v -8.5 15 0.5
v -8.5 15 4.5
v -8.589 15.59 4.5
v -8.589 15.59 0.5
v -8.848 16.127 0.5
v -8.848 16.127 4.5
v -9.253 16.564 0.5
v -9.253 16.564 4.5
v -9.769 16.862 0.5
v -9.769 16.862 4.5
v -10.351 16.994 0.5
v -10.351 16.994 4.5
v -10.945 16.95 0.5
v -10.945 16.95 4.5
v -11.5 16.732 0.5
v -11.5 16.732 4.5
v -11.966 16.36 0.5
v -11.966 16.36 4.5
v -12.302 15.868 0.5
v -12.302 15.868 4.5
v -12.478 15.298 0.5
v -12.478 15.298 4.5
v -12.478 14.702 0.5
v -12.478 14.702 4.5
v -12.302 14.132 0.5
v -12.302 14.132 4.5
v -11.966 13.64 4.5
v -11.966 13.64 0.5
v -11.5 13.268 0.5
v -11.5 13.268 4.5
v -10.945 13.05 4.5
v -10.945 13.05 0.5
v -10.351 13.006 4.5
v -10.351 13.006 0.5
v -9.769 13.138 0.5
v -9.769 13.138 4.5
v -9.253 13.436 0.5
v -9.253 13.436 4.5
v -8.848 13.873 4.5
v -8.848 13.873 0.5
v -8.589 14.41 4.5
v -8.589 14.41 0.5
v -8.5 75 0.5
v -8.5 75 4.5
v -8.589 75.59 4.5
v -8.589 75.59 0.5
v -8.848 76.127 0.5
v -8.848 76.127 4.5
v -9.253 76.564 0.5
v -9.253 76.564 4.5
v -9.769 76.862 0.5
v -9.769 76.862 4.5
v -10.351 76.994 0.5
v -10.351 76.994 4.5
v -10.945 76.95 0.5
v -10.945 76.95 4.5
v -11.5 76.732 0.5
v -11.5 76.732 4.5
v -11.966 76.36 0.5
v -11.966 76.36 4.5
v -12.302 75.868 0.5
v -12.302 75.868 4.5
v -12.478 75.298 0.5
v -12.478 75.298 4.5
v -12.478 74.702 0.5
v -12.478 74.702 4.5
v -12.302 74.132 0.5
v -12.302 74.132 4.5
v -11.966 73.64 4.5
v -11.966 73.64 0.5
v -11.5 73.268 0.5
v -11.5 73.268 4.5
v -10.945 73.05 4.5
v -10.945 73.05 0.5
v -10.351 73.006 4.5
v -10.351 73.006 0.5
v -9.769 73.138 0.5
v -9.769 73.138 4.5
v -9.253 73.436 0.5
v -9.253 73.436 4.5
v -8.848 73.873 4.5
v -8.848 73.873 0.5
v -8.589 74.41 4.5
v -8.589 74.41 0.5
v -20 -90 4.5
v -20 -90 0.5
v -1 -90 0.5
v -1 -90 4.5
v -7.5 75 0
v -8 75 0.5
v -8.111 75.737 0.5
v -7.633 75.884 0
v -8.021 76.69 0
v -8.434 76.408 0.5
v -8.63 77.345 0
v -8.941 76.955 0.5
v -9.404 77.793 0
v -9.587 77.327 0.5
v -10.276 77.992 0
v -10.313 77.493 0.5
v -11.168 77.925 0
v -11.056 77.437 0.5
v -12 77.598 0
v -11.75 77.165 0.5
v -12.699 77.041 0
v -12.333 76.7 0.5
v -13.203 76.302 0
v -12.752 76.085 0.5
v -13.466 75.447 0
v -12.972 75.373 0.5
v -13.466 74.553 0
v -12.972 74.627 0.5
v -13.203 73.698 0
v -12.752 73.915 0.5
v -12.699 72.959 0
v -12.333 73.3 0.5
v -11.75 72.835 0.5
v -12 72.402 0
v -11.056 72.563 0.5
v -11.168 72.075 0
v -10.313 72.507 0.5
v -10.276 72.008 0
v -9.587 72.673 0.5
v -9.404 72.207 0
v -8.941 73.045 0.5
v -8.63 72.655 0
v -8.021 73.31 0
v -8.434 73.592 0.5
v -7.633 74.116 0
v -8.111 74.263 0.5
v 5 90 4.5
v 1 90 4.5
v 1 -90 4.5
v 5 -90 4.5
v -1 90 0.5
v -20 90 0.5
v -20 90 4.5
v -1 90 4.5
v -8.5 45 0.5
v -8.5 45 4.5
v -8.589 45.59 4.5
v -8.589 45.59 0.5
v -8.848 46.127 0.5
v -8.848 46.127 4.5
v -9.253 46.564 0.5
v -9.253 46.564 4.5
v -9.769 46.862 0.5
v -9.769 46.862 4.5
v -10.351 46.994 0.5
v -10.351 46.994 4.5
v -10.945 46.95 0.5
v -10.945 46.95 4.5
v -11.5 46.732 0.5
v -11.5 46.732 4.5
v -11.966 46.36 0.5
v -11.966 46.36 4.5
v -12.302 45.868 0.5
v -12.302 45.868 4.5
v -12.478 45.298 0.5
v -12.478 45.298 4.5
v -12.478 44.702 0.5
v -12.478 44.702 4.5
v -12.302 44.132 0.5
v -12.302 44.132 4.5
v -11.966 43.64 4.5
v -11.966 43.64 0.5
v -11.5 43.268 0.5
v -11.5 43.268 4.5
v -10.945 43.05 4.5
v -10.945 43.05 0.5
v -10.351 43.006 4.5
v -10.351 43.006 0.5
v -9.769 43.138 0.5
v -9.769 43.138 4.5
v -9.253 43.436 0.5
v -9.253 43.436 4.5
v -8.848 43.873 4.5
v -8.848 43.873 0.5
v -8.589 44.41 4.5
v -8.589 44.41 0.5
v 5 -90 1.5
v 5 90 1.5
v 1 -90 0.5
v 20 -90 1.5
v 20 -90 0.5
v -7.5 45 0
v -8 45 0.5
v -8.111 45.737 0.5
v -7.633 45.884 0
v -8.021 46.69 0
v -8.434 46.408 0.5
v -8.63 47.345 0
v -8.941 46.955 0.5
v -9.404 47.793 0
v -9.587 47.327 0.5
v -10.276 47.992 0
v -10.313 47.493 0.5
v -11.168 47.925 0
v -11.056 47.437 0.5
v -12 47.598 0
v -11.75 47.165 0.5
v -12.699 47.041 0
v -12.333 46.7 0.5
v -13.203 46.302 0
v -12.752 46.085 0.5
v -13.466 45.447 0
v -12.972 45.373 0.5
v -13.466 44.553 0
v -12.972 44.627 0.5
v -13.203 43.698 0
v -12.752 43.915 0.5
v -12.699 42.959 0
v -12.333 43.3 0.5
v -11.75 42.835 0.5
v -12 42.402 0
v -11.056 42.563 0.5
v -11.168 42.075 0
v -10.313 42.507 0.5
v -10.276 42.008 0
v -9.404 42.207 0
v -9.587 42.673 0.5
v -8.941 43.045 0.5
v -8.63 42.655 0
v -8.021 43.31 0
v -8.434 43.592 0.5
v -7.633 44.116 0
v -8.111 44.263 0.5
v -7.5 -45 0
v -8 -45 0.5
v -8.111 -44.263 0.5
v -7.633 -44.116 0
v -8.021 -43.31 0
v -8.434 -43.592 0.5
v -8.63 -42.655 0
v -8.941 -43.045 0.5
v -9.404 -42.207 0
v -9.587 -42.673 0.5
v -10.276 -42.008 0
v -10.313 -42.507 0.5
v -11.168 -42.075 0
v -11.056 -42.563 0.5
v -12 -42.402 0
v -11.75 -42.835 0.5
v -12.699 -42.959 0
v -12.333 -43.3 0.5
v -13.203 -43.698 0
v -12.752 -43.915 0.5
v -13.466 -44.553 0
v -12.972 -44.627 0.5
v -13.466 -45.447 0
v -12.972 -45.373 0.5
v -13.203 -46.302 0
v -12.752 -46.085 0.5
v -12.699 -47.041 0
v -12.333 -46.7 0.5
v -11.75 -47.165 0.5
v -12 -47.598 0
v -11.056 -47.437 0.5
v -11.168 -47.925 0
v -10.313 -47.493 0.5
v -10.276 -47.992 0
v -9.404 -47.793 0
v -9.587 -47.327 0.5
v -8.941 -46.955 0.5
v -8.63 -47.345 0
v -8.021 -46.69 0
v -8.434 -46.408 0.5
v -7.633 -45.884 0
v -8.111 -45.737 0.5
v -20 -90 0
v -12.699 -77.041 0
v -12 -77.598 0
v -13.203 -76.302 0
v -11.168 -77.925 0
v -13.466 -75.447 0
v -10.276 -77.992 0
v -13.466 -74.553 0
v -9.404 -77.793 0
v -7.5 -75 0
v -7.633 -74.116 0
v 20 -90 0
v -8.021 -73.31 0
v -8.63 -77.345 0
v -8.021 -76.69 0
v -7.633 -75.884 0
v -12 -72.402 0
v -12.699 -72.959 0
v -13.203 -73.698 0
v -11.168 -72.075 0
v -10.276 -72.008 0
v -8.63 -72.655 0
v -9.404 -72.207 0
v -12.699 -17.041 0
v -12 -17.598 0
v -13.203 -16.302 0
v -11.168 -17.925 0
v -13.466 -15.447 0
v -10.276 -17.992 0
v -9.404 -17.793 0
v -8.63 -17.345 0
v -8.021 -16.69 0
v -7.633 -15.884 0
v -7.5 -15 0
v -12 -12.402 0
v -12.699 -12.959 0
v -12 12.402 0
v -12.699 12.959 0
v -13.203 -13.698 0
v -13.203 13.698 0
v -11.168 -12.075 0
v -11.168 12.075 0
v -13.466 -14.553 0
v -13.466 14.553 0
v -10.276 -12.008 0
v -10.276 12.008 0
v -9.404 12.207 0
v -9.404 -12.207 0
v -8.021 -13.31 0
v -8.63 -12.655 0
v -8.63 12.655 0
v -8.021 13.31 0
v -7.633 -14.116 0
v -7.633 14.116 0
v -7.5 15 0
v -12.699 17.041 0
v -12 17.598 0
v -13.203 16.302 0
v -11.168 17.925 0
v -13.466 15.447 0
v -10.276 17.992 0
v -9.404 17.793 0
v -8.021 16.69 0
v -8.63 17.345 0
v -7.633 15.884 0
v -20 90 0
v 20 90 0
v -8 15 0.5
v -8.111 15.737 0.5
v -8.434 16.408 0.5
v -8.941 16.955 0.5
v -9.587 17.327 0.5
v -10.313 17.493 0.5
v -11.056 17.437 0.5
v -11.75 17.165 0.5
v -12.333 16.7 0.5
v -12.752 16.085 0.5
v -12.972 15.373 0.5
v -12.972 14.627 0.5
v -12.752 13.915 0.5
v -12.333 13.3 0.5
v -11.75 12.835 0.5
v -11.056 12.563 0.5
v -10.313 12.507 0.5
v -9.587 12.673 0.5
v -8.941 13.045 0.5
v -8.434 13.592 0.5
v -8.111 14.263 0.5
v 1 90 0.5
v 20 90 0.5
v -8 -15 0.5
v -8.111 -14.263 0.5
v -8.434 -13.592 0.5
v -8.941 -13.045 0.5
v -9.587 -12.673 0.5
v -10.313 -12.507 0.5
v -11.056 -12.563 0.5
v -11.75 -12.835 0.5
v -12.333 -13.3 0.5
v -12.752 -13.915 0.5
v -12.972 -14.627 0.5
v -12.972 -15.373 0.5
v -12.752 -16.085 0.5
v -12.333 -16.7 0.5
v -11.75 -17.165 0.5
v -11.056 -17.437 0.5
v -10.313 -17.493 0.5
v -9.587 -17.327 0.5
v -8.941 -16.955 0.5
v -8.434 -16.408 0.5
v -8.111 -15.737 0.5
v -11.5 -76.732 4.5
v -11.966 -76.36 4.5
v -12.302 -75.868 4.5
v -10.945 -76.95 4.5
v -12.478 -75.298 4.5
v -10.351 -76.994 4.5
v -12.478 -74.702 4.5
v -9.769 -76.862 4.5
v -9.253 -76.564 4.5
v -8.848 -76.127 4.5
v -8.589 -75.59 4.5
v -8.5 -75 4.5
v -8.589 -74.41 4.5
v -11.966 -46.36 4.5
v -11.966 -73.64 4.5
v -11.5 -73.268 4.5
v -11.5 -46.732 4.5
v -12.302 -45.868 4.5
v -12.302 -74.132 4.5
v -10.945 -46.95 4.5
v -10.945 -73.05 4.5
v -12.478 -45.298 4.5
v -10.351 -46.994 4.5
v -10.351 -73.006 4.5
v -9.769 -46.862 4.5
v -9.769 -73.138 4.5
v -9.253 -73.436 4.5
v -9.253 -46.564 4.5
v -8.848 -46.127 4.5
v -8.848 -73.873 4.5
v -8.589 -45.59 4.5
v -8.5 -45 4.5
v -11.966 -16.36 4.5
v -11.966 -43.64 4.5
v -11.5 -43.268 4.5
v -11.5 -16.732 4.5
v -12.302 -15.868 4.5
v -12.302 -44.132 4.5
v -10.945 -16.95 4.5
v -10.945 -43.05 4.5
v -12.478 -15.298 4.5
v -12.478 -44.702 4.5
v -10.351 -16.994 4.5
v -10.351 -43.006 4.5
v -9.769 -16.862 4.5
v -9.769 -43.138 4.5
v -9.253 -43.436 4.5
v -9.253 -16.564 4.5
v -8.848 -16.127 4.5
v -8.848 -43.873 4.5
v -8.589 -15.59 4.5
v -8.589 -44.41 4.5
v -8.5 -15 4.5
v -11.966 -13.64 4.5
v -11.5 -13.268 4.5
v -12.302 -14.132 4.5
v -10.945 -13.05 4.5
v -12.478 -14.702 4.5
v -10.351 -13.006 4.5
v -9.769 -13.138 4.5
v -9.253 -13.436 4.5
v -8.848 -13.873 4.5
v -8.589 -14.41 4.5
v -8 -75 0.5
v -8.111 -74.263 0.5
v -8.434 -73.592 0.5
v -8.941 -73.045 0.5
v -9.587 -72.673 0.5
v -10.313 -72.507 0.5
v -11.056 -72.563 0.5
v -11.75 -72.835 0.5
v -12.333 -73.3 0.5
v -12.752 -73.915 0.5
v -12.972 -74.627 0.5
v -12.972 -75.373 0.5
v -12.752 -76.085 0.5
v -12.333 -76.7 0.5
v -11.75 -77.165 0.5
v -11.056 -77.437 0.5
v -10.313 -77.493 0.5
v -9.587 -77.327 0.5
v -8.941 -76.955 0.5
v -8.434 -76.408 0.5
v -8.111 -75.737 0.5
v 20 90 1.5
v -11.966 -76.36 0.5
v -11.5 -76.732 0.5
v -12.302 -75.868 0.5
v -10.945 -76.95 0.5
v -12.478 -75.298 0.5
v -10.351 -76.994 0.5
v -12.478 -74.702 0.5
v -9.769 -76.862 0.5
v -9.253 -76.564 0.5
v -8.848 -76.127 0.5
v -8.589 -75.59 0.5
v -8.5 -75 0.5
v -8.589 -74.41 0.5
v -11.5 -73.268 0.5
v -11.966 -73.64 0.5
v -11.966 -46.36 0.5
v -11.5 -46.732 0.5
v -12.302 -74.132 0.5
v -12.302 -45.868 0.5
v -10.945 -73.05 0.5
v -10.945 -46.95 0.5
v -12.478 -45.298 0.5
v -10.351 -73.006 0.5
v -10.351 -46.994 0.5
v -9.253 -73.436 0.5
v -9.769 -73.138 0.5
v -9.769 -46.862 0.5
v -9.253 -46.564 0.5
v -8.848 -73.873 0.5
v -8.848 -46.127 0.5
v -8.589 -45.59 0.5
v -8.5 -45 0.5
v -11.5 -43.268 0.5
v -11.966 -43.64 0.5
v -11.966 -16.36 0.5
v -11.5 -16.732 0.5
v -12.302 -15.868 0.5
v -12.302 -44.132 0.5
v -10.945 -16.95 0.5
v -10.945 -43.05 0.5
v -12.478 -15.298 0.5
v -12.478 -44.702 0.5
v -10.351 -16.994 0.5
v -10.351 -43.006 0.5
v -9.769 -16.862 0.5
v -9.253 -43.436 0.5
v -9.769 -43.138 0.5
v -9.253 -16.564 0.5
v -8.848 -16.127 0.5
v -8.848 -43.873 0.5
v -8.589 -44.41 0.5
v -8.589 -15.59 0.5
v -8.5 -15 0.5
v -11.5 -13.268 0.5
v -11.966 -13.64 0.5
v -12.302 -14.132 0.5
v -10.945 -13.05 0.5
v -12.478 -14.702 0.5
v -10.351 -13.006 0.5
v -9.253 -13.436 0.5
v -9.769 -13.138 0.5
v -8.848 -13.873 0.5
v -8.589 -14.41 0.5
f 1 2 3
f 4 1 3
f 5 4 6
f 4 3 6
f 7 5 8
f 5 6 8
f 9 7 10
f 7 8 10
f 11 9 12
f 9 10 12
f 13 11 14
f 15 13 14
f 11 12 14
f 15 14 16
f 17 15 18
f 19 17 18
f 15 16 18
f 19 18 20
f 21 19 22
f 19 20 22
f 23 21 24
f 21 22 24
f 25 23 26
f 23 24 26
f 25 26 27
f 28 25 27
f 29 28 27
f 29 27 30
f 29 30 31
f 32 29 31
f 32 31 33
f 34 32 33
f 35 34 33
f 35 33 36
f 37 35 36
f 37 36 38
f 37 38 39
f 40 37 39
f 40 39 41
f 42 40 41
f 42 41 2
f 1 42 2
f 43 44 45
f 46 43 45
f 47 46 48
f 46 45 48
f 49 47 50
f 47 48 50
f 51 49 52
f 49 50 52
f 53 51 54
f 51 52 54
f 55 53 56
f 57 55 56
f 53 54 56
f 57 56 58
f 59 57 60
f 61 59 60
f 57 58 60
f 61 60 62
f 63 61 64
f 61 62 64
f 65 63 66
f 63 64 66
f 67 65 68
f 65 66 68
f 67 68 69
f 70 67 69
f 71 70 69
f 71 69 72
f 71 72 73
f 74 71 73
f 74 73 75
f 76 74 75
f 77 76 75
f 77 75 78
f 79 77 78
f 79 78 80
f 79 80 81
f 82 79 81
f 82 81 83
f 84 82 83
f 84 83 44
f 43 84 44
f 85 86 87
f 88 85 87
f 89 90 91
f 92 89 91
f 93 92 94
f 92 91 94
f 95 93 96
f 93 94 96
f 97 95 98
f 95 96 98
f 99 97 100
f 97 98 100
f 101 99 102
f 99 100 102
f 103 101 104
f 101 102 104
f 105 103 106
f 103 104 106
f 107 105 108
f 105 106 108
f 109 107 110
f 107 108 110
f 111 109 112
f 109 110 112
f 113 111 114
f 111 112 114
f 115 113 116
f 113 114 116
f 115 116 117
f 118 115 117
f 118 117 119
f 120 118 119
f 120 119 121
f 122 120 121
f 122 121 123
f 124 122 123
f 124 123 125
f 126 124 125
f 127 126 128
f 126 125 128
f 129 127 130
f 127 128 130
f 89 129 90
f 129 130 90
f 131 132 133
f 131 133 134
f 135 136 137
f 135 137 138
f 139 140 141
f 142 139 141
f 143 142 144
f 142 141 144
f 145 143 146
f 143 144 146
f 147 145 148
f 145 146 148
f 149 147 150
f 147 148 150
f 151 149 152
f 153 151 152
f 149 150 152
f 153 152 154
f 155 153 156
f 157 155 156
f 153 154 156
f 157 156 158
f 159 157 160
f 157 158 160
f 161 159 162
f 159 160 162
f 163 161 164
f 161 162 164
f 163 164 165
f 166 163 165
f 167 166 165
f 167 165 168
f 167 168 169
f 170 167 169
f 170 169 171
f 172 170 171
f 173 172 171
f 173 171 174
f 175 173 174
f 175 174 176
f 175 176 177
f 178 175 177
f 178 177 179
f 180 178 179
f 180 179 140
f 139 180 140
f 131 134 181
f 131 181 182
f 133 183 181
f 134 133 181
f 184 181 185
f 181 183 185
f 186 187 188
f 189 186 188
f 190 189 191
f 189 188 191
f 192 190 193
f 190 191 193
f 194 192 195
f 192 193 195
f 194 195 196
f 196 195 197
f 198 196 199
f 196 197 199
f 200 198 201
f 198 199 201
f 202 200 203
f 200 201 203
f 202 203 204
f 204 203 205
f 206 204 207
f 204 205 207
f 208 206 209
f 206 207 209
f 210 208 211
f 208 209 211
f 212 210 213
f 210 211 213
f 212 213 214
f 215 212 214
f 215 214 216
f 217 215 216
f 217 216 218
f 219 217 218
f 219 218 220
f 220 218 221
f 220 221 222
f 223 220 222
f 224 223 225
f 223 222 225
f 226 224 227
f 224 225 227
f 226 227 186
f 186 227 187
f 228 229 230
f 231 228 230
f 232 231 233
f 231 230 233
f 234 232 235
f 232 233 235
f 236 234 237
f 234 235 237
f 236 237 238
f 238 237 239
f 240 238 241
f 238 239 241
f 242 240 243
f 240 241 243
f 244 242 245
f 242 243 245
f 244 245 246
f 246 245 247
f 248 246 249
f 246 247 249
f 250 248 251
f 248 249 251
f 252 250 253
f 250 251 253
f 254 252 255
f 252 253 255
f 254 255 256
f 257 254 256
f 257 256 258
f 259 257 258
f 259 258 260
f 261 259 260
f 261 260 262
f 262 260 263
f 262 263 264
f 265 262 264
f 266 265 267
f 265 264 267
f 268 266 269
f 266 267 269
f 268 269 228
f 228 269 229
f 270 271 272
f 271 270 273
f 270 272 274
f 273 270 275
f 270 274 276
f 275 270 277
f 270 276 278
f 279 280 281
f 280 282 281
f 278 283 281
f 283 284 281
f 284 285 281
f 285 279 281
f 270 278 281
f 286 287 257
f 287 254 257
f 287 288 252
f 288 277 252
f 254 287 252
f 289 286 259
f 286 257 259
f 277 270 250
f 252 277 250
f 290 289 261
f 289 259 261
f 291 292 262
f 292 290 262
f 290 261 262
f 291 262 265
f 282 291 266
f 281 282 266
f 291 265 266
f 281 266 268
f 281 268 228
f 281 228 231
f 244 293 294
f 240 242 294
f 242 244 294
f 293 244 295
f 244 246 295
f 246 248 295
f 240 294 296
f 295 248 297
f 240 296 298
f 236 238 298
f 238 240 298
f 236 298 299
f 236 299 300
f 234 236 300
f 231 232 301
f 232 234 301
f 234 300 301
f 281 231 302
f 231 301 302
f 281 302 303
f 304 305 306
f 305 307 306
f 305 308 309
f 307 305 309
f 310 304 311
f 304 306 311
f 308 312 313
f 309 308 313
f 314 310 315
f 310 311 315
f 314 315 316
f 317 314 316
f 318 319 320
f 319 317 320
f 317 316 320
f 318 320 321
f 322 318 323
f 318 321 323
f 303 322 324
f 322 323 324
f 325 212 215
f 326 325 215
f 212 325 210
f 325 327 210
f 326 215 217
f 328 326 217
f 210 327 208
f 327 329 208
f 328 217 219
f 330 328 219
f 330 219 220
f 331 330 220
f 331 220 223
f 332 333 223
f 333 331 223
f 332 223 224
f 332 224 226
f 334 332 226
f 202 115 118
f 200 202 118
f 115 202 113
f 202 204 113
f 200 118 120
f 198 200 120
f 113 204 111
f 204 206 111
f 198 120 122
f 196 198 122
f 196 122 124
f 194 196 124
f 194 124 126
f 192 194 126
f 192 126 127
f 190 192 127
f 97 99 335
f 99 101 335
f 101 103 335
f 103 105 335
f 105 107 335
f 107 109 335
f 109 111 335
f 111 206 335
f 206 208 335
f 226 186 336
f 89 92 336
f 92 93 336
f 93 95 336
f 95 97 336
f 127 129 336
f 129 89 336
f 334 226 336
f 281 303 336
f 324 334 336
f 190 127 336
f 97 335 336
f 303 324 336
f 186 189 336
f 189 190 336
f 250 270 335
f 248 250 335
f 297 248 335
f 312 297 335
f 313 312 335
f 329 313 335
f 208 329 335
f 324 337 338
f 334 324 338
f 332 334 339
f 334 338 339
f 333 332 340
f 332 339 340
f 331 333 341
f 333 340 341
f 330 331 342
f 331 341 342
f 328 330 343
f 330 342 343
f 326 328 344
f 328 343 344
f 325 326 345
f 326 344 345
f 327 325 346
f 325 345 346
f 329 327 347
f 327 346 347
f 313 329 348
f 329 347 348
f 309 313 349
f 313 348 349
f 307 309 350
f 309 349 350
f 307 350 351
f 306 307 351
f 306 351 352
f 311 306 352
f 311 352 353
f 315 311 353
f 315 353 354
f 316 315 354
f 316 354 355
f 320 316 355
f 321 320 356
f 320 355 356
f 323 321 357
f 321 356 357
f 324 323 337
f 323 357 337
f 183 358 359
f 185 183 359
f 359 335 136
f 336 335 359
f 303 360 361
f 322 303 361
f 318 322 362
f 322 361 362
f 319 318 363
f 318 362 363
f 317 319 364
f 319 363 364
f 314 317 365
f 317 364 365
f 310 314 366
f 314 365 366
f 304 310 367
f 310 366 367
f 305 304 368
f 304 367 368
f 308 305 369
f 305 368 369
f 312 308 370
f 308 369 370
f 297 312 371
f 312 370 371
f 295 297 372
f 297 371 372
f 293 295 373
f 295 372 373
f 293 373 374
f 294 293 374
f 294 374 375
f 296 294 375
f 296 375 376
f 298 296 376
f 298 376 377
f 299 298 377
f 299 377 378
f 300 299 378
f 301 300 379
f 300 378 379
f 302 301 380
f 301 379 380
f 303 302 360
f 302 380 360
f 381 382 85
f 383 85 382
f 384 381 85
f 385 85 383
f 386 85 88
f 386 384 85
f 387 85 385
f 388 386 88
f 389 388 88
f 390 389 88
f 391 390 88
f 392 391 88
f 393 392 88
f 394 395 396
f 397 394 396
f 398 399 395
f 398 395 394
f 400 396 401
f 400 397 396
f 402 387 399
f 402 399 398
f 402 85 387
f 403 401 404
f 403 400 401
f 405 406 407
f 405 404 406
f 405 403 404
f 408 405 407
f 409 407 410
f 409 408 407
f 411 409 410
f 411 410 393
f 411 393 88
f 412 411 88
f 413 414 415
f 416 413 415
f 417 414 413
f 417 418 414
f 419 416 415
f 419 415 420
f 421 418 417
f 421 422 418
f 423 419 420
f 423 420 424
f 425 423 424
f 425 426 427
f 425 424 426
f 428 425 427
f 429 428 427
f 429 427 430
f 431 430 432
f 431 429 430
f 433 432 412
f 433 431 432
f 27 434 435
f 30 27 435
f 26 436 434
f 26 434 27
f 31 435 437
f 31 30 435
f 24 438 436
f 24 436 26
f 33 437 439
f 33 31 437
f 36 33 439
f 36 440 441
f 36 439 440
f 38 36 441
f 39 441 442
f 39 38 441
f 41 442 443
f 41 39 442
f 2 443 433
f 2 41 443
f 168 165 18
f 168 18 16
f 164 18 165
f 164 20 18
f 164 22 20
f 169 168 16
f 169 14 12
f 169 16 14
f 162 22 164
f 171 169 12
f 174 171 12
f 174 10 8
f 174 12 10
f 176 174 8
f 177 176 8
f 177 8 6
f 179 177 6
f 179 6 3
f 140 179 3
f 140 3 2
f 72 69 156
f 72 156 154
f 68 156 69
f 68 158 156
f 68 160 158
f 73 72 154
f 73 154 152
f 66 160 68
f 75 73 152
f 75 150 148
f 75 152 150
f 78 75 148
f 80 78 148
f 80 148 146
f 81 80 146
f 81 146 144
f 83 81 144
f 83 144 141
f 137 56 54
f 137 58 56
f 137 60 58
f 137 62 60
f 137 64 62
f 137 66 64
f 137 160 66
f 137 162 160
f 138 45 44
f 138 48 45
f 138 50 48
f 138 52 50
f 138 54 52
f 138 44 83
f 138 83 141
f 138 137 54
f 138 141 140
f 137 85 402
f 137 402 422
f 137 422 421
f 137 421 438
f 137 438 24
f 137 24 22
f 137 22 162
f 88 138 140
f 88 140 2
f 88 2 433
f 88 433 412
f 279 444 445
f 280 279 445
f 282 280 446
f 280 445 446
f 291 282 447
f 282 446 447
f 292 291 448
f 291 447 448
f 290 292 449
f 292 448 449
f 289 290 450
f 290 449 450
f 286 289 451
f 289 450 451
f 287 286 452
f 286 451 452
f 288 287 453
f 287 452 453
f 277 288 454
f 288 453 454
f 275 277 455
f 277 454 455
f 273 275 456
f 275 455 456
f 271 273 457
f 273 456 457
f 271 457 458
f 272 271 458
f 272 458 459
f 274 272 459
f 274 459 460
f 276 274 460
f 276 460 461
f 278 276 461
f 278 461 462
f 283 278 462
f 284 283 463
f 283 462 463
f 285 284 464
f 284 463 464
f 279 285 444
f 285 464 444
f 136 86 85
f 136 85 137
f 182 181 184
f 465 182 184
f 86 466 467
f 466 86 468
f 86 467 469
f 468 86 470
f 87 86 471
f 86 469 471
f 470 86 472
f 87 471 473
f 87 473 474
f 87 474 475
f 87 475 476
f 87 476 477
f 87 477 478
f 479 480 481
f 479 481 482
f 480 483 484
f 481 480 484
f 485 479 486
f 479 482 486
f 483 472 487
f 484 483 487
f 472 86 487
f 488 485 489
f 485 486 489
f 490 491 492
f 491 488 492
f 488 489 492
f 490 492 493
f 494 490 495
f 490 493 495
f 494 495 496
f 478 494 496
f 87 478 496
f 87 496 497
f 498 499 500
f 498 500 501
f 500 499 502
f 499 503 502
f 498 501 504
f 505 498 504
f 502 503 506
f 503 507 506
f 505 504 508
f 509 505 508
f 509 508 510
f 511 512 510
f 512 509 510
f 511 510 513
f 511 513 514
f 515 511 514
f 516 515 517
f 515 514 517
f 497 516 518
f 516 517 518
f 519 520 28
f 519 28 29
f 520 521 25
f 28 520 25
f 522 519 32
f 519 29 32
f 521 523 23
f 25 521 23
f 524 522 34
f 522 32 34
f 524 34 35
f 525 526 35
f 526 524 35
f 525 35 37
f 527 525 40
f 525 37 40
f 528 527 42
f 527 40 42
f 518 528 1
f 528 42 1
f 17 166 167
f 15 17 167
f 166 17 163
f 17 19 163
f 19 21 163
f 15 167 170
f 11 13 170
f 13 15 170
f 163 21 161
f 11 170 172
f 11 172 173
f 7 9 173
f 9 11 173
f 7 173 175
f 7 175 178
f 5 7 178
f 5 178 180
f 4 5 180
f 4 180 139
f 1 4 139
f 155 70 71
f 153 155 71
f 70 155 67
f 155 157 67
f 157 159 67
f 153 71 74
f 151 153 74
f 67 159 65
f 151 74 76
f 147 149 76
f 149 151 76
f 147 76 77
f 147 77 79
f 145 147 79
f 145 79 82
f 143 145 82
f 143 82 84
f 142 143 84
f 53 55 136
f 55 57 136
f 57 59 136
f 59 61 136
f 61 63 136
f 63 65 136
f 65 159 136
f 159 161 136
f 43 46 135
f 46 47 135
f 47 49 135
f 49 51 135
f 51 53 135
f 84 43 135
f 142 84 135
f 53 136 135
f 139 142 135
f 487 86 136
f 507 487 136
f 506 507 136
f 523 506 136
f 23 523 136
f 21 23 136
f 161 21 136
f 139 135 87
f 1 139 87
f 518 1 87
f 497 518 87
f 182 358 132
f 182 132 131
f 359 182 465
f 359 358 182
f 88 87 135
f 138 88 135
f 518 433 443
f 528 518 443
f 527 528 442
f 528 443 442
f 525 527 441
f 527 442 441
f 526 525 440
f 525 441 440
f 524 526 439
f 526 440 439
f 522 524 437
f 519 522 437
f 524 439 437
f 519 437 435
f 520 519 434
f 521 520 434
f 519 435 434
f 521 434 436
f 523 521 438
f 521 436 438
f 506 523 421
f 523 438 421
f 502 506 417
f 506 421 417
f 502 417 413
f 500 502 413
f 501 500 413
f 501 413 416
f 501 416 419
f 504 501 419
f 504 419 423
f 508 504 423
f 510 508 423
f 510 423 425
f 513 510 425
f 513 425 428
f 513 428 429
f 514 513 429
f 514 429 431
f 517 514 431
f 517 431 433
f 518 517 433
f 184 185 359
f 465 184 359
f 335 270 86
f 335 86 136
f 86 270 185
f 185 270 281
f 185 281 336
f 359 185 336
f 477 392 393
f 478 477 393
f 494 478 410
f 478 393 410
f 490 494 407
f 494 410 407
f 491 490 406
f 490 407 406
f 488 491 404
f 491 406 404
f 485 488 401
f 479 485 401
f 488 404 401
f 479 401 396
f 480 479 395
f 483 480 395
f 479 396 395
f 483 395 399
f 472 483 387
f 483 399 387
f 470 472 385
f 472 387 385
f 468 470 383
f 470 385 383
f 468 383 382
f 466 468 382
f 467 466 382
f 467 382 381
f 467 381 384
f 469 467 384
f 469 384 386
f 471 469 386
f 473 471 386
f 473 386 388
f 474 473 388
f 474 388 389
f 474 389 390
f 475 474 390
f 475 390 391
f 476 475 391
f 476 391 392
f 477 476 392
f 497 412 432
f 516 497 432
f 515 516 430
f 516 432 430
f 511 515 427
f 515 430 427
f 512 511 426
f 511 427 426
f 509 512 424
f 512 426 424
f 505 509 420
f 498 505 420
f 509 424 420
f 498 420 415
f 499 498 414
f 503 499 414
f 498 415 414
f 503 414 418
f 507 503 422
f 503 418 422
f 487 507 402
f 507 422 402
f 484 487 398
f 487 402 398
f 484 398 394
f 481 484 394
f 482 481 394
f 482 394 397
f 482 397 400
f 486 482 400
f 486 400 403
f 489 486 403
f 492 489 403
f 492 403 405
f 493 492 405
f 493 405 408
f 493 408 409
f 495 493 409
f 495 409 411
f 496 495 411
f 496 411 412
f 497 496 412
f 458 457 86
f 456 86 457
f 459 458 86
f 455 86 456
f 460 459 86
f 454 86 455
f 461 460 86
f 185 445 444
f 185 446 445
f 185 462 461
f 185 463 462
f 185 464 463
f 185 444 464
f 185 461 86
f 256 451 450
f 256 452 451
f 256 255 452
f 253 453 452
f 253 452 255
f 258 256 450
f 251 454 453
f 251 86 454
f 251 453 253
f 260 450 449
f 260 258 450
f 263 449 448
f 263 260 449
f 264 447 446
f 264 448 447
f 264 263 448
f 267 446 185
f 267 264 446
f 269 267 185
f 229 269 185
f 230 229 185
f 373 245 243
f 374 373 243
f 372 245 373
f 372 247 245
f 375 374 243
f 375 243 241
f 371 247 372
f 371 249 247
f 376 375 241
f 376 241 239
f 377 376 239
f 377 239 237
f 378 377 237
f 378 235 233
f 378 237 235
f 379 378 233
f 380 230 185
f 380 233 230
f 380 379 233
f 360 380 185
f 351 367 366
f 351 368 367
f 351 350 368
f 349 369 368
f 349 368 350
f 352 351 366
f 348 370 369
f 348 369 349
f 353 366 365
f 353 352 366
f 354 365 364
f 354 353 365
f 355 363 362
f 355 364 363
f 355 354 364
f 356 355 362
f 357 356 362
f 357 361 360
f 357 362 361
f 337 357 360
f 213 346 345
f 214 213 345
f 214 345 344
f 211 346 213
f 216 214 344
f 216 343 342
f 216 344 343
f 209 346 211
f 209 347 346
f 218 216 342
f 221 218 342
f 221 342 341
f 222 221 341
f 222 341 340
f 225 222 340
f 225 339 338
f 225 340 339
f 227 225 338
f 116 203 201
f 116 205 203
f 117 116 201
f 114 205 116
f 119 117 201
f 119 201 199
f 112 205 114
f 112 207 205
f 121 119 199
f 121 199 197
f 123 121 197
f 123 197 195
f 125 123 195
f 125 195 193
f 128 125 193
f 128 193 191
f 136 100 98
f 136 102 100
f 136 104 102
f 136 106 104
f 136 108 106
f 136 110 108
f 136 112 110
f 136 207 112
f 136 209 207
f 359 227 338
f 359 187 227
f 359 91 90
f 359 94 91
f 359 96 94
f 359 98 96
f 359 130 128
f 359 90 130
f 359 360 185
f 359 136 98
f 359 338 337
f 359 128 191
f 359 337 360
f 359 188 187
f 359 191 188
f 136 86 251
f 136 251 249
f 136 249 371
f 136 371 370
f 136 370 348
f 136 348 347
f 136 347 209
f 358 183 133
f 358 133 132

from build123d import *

# Parameters (mm, degrees)
F0_W     = 40
F0_H     = 180
F1_DEPTH = 0.5
F2_W     = 19
F2_H     = 180
F3_DEPTH = 4
F4_W     = 15
F4_H     = 180
F5_DEPTH = 3
F6_R     = 2
F7_DEPTH = 4.501


# Not quite as in the source:
# - a fillet or chamfer that OpenCascade refuses, or shapes differently, is made with other operations: its cross-section is extruded or revolved along the edge and cut away or added


with BuildPart() as f1:
    # F0 (on Top) → F1 (new body)
    with BuildSketch(Plane.XY):
        Rectangle(F0_W, F0_H)
    extrude(amount=F1_DEPTH)


with BuildPart() as f3:
    # F2 (on face) → F3 (new body)
    with BuildSketch(Plane.XY.offset(0.5)):
        with Locations((10.5, 0)):
            Rectangle(F2_W, F2_H)
    extrude(amount=F3_DEPTH)

    # F4 (on face) → F5 (cut)
    with BuildSketch(Plane.XY.offset(4.5)):
        with Locations((12.5, 0)):
            Rectangle(F4_W, F4_H)
    extrude(amount=-F5_DEPTH, mode=Mode.SUBTRACT)


with BuildPart() as f3b:
    # F2 (on face) → F3, piece 2 (new body)
    with BuildSketch(Plane.XY.offset(0.5)):
        with Locations((-10.5, 0)):
            Rectangle(F2_W, F2_H)
    extrude(amount=F3_DEPTH)


with BuildPart() as f7_tool:
    # F6 (on face) → F7 (new body, through all)
    with BuildSketch(Plane.XY.offset(4.5)):
        with Locations((-10.5, 15)):
            Circle(F6_R)
        with Locations((-10.5, 45)):
            Circle(F6_R)
        with Locations((-10.5, 75)):
            Circle(F6_R)
        with Locations((-10.5, -45)):
            Circle(F6_R)
        with Locations((-10.5, -15)):
            Circle(F6_R)
        with Locations((-10.5, -75)):
            Circle(F6_R)
    extrude(amount=-F7_DEPTH)


with BuildPart() as f1_1:
    add(f1.part)

    # F7: cut by f7_tool
    add(f7_tool.part, mode=Mode.SUBTRACT)

    # F8: chamfer of 1 on 6 edges, made by hand

    # F8_s1 → F8_t2 (revolve, cut)
    with BuildSketch(Plane.XZ.offset(75)):
        Polygon((-7.5, 0), (-8.5, 1), (-8.5, 0), align=None)
    revolve(axis=Axis((-10.5, -75, 0), (0, 0, 1)), mode=Mode.SUBTRACT)

    # F8_s3 → F8_t4 (revolve, cut)
    with BuildSketch(Plane.XZ.offset(45)):
        Polygon((-7.5, 0), (-8.5, 1), (-8.5, 0), align=None)
    revolve(axis=Axis((-10.5, -45, 0), (0, 0, 1)), mode=Mode.SUBTRACT)

    # F8_s5 → F8_t6 (revolve, cut)
    with BuildSketch(Plane.XZ.offset(15)):
        Polygon((-7.5, 0), (-8.5, 1), (-8.5, 0), align=None)
    revolve(axis=Axis((-10.5, -15, 0), (0, 0, 1)), mode=Mode.SUBTRACT)

    # F8_s7 → F8_t8 (revolve, cut)
    with BuildSketch(Plane.XZ.offset(-15)):
        Polygon((-7.5, 0), (-8.5, 1), (-8.5, 0), align=None)
    revolve(axis=Axis((-10.5, 15, 0), (0, 0, 1)), mode=Mode.SUBTRACT)

    # F8_s9 → F8_t10 (revolve, cut)
    with BuildSketch(Plane.XZ.offset(-45)):
        Polygon((-7.5, 0), (-8.5, 1), (-8.5, 0), align=None)
    revolve(axis=Axis((-10.5, 45, 0), (0, 0, 1)), mode=Mode.SUBTRACT)

    # F8_s11 → F8_t12 (revolve, cut)
    with BuildSketch(Plane.XZ.offset(-75)):
        Polygon((-7.5, 0), (-8.5, 1), (-8.5, 0), align=None)
    revolve(axis=Axis((-10.5, 75, 0), (0, 0, 1)), mode=Mode.SUBTRACT)


with BuildPart() as f3b_1:
    add(f3b.part)

    # F7: cut by f7_tool
    add(f7_tool.part, mode=Mode.SUBTRACT)


solid = Compound([f3.part, f1_1.part, f3b_1.part])
